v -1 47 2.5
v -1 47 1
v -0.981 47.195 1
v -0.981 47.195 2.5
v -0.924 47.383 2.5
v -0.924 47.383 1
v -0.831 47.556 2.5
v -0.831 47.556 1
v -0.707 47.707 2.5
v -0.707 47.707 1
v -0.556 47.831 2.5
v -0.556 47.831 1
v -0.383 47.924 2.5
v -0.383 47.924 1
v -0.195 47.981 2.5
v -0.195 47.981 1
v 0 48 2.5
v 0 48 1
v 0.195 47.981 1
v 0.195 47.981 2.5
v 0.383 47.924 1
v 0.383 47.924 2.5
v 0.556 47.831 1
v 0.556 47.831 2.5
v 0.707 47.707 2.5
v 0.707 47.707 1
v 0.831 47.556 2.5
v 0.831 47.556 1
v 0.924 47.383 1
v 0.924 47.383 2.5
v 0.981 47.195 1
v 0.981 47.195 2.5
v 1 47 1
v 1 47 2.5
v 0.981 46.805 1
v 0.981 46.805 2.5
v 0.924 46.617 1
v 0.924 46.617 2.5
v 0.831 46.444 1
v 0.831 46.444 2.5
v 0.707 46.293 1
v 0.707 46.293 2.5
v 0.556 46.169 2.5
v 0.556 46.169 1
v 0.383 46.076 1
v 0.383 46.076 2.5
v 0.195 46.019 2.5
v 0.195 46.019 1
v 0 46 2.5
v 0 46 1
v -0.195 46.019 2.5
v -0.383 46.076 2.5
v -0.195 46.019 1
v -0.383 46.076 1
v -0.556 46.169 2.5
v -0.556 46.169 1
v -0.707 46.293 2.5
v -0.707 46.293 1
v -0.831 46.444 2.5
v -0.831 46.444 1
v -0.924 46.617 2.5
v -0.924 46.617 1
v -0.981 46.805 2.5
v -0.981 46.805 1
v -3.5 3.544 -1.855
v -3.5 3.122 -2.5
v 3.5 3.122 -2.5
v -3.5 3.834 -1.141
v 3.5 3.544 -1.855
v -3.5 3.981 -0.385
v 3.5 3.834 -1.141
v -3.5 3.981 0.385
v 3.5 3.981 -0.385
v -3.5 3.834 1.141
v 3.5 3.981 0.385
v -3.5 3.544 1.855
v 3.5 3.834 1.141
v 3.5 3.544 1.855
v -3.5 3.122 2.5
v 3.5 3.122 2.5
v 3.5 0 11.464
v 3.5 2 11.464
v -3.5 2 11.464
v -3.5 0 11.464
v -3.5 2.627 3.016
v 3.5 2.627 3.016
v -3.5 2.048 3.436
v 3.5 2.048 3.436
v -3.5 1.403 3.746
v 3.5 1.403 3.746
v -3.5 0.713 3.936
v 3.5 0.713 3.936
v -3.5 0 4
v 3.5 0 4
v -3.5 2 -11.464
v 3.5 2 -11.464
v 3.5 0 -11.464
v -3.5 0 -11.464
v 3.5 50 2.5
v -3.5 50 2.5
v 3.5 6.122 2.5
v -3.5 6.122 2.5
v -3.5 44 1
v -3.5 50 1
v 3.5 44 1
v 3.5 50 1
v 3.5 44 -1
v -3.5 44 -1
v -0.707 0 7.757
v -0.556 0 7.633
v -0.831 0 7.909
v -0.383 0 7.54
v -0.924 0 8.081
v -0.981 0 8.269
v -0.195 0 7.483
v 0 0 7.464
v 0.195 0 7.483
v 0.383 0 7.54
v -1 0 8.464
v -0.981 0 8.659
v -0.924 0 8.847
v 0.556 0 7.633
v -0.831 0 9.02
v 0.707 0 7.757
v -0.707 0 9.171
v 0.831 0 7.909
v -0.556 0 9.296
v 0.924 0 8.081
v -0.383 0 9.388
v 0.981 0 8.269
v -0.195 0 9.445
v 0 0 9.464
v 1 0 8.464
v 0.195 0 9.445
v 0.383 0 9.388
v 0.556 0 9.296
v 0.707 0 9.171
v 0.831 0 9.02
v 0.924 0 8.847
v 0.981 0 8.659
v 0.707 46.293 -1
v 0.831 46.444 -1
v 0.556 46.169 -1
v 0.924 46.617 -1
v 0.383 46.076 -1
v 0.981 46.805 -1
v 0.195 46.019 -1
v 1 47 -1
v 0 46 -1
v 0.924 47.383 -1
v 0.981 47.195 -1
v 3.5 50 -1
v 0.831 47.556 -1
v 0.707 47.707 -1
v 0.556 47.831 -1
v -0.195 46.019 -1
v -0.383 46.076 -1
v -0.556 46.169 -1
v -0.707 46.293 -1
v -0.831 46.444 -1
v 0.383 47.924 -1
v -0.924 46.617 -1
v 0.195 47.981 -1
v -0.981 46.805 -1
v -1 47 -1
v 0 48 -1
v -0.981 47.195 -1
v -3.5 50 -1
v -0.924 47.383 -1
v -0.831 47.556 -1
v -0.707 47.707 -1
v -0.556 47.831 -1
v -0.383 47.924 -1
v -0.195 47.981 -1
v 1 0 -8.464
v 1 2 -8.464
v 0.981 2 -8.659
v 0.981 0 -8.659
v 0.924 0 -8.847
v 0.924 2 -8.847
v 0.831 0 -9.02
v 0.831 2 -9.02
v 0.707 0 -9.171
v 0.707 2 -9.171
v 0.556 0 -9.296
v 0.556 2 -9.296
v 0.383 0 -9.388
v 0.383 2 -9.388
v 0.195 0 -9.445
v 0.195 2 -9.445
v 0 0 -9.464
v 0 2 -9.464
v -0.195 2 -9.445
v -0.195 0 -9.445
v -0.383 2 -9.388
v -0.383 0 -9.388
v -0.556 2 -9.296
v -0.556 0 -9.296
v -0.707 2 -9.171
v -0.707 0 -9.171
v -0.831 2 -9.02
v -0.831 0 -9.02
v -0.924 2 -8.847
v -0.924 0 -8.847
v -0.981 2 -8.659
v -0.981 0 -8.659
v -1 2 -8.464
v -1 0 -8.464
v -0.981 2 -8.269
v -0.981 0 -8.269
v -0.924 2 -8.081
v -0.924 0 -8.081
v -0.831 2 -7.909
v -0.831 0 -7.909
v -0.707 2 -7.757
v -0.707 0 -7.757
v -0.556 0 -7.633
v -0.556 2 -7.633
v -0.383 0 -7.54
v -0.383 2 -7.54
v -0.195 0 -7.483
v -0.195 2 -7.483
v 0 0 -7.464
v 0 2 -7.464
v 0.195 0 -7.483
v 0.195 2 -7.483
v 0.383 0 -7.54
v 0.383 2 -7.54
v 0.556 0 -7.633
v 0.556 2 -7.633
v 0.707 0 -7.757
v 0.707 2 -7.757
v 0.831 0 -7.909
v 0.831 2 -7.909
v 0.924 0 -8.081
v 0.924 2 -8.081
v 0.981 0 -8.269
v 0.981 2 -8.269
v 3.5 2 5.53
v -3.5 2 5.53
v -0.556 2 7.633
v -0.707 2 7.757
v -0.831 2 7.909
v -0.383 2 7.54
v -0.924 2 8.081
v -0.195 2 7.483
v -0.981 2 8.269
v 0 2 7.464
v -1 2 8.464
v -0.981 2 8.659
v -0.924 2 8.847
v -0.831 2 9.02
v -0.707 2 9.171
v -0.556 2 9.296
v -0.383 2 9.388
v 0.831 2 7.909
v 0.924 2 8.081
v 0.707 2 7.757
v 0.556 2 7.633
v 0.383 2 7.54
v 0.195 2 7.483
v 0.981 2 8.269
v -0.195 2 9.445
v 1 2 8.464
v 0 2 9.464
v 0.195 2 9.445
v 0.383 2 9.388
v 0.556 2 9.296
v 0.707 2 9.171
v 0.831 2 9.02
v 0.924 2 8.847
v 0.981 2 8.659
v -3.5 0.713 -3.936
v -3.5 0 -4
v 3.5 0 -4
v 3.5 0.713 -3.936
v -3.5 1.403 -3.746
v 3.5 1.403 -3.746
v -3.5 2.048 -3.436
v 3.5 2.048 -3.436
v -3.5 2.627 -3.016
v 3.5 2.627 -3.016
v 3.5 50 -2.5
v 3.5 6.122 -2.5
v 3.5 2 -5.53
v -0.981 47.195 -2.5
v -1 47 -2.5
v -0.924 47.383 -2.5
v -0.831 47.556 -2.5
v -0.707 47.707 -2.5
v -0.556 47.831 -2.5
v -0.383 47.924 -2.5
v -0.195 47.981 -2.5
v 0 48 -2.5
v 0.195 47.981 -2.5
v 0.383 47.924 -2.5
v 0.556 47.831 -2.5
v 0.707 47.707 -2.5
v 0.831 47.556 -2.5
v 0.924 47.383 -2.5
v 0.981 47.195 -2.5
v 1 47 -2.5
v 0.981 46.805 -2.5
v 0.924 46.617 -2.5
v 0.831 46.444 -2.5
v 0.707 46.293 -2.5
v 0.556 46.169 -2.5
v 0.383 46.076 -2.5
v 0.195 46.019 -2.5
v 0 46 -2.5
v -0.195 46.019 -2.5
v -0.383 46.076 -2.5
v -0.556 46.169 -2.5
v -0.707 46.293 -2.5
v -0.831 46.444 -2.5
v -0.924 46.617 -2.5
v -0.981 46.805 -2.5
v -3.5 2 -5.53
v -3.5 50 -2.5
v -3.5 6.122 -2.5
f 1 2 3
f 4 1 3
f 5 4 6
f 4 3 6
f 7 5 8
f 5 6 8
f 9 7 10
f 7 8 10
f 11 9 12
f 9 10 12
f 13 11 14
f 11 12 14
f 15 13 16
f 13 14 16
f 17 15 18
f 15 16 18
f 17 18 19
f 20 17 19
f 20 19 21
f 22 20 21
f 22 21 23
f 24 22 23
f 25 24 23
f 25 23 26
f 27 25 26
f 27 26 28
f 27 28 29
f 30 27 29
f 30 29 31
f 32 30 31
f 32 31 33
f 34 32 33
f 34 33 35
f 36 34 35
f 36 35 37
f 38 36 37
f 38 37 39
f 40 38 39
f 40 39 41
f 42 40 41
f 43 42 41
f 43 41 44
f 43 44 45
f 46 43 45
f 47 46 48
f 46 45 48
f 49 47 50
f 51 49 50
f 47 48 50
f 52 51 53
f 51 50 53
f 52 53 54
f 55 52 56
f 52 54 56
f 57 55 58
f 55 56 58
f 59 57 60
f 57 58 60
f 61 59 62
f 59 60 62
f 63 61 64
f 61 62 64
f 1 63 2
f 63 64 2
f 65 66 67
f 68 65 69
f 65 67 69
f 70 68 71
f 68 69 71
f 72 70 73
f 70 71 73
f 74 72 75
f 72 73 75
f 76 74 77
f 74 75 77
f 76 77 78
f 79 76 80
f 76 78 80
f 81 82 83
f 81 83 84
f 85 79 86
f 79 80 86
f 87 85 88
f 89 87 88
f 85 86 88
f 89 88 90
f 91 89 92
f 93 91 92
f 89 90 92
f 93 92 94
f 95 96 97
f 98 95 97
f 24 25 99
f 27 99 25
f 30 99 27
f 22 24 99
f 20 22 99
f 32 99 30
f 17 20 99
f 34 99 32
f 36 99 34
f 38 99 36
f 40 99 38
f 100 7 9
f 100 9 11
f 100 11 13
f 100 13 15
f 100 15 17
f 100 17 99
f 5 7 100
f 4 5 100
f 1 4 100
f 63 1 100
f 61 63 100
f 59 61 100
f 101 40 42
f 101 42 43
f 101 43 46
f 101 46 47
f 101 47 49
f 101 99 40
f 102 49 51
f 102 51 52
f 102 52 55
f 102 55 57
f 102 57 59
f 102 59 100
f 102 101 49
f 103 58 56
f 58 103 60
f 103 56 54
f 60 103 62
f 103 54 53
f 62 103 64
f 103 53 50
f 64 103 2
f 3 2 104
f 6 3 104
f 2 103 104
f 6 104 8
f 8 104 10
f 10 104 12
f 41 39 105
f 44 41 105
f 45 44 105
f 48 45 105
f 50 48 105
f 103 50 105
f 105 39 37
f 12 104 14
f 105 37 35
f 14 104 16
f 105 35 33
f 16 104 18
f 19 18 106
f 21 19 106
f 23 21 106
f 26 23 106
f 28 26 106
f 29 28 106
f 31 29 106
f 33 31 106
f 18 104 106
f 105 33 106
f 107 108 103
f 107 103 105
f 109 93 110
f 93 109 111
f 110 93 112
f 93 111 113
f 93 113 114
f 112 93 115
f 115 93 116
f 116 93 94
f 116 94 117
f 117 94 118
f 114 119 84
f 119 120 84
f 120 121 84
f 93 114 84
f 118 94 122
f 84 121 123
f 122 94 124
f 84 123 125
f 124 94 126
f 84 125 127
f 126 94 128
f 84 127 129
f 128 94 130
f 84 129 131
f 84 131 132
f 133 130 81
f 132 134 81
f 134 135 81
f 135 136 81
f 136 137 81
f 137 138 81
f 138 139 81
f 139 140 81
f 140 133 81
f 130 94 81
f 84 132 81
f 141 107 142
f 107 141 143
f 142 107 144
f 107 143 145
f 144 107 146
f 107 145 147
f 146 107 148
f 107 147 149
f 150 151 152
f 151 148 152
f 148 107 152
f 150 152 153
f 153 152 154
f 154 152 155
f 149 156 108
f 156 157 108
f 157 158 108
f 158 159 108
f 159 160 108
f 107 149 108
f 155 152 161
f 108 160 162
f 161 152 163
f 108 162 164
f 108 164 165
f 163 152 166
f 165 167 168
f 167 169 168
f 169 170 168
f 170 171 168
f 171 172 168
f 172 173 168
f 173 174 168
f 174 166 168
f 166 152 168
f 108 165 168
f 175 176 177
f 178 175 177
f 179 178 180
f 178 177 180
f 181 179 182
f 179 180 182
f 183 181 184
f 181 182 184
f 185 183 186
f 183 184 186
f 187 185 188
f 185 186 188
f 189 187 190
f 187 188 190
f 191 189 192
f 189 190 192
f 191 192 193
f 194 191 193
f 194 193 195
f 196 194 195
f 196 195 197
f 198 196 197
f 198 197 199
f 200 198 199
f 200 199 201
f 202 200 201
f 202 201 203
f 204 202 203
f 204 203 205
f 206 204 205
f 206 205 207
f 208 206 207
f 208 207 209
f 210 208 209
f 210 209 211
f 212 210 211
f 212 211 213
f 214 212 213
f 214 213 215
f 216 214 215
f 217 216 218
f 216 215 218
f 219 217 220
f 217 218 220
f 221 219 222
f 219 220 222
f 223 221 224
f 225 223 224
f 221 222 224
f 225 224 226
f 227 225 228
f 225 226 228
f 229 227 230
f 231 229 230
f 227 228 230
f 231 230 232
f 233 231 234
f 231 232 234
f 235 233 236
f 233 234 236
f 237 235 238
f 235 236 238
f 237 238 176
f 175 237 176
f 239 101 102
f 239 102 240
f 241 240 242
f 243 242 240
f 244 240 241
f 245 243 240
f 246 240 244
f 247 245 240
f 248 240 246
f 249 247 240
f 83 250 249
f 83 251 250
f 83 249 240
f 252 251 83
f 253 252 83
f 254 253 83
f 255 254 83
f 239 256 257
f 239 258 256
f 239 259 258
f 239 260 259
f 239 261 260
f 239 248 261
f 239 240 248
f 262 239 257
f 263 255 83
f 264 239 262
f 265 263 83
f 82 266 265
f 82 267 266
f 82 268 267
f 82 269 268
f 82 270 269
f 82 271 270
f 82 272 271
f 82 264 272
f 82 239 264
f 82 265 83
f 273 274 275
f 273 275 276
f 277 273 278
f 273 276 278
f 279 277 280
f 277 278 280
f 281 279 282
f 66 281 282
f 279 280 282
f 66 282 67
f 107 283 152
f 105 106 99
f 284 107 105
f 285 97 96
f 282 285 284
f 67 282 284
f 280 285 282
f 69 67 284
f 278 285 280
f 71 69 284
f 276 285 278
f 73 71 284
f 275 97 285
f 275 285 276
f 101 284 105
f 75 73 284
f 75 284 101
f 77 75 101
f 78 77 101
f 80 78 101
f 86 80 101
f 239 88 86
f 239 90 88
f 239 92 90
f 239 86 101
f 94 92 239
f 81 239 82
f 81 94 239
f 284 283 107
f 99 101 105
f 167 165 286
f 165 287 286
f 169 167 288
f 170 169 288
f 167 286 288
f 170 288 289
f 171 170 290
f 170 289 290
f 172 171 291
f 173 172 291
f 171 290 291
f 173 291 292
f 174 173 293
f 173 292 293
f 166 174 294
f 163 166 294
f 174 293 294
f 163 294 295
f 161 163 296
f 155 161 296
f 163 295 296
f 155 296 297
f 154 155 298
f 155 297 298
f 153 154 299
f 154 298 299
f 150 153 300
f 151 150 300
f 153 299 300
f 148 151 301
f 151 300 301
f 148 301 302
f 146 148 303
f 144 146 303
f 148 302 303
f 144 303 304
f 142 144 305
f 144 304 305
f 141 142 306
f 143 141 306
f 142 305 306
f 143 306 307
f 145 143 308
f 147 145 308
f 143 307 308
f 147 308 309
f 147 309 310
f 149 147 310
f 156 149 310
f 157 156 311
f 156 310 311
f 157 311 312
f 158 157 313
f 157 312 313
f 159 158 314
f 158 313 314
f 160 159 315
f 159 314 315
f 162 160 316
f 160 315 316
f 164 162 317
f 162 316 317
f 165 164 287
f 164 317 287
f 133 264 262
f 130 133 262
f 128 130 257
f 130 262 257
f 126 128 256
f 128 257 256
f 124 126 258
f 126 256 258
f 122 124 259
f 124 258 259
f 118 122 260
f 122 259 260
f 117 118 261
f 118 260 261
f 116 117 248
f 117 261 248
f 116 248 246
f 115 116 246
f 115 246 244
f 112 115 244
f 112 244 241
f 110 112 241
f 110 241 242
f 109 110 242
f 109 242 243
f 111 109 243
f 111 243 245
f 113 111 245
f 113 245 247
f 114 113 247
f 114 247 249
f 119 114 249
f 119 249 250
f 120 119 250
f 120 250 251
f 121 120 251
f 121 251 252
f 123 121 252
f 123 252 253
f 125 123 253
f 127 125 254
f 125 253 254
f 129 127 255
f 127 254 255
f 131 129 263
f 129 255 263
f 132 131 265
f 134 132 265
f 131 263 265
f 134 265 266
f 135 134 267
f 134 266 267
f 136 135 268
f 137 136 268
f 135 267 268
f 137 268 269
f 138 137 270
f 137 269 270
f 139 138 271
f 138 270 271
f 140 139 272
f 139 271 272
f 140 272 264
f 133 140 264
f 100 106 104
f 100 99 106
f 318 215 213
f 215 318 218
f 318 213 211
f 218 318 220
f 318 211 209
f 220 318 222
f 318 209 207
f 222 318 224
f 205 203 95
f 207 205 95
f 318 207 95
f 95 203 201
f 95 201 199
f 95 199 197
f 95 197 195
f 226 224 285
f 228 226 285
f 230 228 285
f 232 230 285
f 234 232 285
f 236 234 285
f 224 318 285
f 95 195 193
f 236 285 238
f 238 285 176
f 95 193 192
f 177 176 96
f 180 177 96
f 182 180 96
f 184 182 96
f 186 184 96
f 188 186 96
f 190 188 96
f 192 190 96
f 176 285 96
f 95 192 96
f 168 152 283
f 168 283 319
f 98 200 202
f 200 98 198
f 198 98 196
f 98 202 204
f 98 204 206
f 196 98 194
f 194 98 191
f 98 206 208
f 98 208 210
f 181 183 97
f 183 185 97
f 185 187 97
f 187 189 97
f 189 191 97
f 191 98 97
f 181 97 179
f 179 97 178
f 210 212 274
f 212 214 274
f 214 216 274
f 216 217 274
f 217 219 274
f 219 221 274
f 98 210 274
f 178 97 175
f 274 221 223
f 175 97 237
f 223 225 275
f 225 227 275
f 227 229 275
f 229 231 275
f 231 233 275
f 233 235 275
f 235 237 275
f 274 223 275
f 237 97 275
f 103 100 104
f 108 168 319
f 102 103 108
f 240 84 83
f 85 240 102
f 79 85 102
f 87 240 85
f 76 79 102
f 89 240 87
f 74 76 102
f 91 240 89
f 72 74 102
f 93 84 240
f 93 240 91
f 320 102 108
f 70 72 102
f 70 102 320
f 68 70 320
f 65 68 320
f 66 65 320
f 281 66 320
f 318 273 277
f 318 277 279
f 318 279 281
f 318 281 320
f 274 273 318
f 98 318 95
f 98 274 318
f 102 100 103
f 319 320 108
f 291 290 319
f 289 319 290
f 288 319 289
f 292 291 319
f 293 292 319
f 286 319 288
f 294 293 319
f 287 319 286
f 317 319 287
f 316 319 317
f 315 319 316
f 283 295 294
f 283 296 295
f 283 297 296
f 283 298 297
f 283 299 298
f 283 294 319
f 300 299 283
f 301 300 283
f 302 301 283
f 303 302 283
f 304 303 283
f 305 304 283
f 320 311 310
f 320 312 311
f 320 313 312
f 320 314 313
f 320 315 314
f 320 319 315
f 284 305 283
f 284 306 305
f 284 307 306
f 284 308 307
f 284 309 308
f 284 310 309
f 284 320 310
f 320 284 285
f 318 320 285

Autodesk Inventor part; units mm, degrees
ref_plane "YZ Plane" through (0, 0, 0) normal (1, 0, 0) x (0, 1, 0)
ref_plane "XZ Plane" through (0, 0, 0) normal (0, 1, 0) x (-1, 0, 0)
ref_plane "XY Plane" through (0, 0, 0) normal (0, 0, 1) x (1, 0, 0)
sketch "Sketch1" plane through (0, 0, 0) normal (0, 1, 0) x (-1, 0, 0)
  line L0 (-3.5, 2.5) -> (3.5, 2.5)
  line L1 (3.5, 2.5) -> (3.5, -2.5)
  line L2 (3.5, -2.5) -> (-3.5, -2.5)
  line L3 (-3.5, -2.5) -> (-3.5, 2.5)
  line L4 (-3.5, 2.5) -> (3.5, -2.5) construction
  line L5 (3.5, 2.5) -> (-3.5, -2.5) construction
  point P0 (0, 0)
  dimension "d0" = 5
  dimension "d1" = 7
extrude "Extrusion1" add sketch "Sketch1" along normal blind 50
sketch "Sketch2" plane through (0, 50, 0) normal (0, 1, 0) x (1, 0, 0)
  line L0 (-3.5, -2.5) -> (3.5, -2.5) projected
  line L1 (3.5, -2.5) -> (3.5, 2.5) projected
  line L2 (3.5, 2.5) -> (-3.5, 2.5) projected
  line L3 (-3.5, 2.5) -> (-3.5, -2.5) projected
  line L4 (-3.5, -1) -> (3.5, -1)
  line L5 (3.5, -1) -> (3.5, 1)
  line L6 (3.5, 1) -> (-3.5, 1)
  line L7 (-3.5, 1) -> (-3.5, -1)
  point P0 (0, 0)
  dimension "d4" = 1.5
  dimension "d5" = 1.5
extrude "Extrusion2" cut sketch "Sketch2" against normal blind 6 contours L3 L6 L1 L4
sketch "Sketch3" plane through (3.5, 0, -2.5) normal (0, 0, -1) x (-1, 0, 0)
  line L0 (7, 0) -> (7, 50) projected
  line L1 (0, 50) -> (7, 50) projected
  circle A0 centre (3.5, 47) radius 1
  point P0 (3.5, 0)
  dimension "d8" = 2
  dimension "d9" = 3
  dimension "d10" = 3.5
extrude "Extrusion3" cut sketch "Sketch3" against normal through all
sketch "Sketch4" plane through (3.5, 0, 2.5) normal (1, 0, 0) x (0, 0, -1)
  line L0 (5, 0) -> (5, 50) projected
  line L1 (0, 0) -> (0, 50) projected
  line L2 (0, 0) -> (5, 0) projected
  circle A0 centre (2.5, 0) radius 4
  line L3 (8.1, 0) -> (-3.1, 0) projected
  dimension "d21" = 8
extrude "Extrusion4" cut sketch "Sketch4" against normal through all
sketch "Sketch6" plane through (3.5, 44, -1) normal (1, 0, 0) x (0, 0, -1)
  arc A0 (1.5, -40.8775) -> (-3.5, -40.8775) centre (-1, -44) ccw construction
  line L0 (1.5, -40.8775) -> (1.5, 6) projected
  line L1 (-3.5, -40.8775) -> (-3.5, 6) projected
  arc A1 (-3.5, -40.8775) -> (-5, -44) centre (-1, -44) ccw
  line L2 (4.6, -44) -> (-6.6, -44) projected
  line L3 (-15.2174, -44) -> (-5, -44) construction
  arc A2 (1.5, -40.8775) -> (-3.5, -40.8775) centre (-1, -44) ccw
  arc A3 (-5, -44) -> (3, -44) centre (-1, -44) ccw construction
  arc A4 (3, -44) -> (1.5, -40.8775) centre (-1, -44) ccw
  line L4 (-3.5, -37.8775) -> (-6.53, -42)
  line L5 (-1, -58.8) -> (-1, 16.8) projected
  line L6 (-4.4641, -42) -> (-6.53, -42) construction
  line L7 (-12.4641, -42) -> (-12.4641, -44)
  line L8 (-12.4641, -44) -> (-5, -44)
  line L9 (-4.4641, -44) -> (-4.4641, -42) construction
  line L10 (-6.53, -42) -> (-12.4641, -42)
  line L11 (-6.53, -42) -> (-8, -44) construction
  line L12 (-5, -44) -> (17.7359, -44) construction
  line L13 (-5, -44) -> (-4.4641, -44) construction
  line L14 (1.5, -37.8775) -> (4.53, -42)
  line L15 (10.4641, -42) -> (10.4641, -44)
  line L16 (10.4641, -44) -> (3, -44)
  line L17 (4.53, -42) -> (10.4641, -42)
  line L18 (1.5, -37.8775) -> (-3.5, -37.8775)
  dimension "d26" = 3
  dimension "d27" = 3
  dimension "d28" = 8
  dimension "d29" = 2
extrude "Extrusion5" add sketch "Sketch6" against normal blind 7 contours A2 L5 L18 L0 | L0 L14 L17 L15 L16 L2 A4 | A2 L1 L18 L5 | A1 L2 L8 L7 L10 L4 L1
sketch "Sketch7" plane through (3.5, 2, 11.4641) normal (0, 1, 0) x (1, 0, 0)
  line L0 (-7, 0) -> (-7, 5.9341) projected
  line L1 (0, 0) -> (-7, 0) projected
  circle A0 centre (-3.5, 3) radius 1
  circle A1 centre (-3.5, 19.9282) radius 1
  line L2 (-7, 16.9941) -> (-7, 22.9282) projected
  line L3 (0, 22.9282) -> (-7, 22.9282) projected
  point P0 (-3.5, 11.4641)
  dimension "d32" = 2
  dimension "d33" = 3
  dimension "d34" = 3.5
  dimension "d35" = 3.5
  dimension "d36" = 3
  dimension "d37" = 2
extrude "Extrusion6" cut sketch "Sketch7" against normal through all
properties part number "LD_holder_p5"
